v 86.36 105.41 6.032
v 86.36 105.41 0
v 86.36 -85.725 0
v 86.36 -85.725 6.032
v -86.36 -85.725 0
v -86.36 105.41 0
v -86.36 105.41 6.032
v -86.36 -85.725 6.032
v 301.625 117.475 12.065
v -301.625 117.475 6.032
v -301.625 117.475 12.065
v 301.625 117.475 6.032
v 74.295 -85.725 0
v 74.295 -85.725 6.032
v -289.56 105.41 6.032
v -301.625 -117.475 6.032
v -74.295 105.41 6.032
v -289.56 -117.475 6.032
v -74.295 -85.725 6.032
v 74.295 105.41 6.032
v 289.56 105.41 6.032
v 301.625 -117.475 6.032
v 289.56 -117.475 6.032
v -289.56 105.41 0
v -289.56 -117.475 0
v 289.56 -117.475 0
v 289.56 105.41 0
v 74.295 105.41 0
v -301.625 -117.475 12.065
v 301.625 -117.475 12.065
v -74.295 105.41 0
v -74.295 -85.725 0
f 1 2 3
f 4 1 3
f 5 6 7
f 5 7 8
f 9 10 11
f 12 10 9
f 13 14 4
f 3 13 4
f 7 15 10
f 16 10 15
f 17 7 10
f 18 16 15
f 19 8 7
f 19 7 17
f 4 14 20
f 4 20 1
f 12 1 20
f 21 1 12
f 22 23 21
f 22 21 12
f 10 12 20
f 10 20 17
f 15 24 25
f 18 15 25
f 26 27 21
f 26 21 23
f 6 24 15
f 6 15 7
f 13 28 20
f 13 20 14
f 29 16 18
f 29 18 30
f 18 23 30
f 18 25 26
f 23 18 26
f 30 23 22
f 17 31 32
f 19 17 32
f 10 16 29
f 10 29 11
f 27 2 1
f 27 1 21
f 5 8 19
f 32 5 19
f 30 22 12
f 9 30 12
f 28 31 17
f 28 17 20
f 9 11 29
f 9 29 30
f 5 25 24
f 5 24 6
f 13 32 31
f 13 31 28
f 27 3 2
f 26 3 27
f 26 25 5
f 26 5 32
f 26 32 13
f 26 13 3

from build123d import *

# Parameters (mm, degrees)
F1_W      = 603.25
F1_H      = 234.95
F2_DEPTH  = 12.065
F3_W      = 12.065
F3_H      = 234.95
F4_DEPTH  = 6.0325
F5_W      = 12.065
F5_H      = 234.95
F6_DEPTH  = 6.0325
F7_W      = 12.065
F7_H      = 234.95
F8_DEPTH  = 6.0325
F9_W      = 12.065
F9_H      = 234.95
F10_DEPTH = 6.0325
F11_W     = 203.2
F11_H     = 12.065
F14_DEPTH = 6.0325
F12_W     = 148.59
F12_H     = 12.065
F15_DEPTH = 6.0325
F13_W     = 203.2
F13_H     = 12.065
F16_DEPTH = 6.0325
F17_W     = 12.065
F17_H     = 31.75
F18_DEPTH = 6.0325
F19_W     = 12.065
F19_H     = 31.75
F20_DEPTH = 6.0325


# Not quite as in the source:
# - a variable given as a bare number and used for a length is read in inches; the dataset says mm whatever the document's units were


with BuildPart() as f2:
    # F1 (on Top) → F2 (new body)
    with BuildSketch(Plane.XY):
        Rectangle(F1_W, F1_H)
    extrude(amount=F2_DEPTH)

    # F3 (on face) → F4 (cut)
    with BuildSketch(Plane(origin=(0, 0, 0), x_dir=(1, 0, 0), z_dir=(0, 0, -1))):
        with Locations((-295.5925, 0)):
            Rectangle(F3_W, F3_H)
    extrude(amount=-F4_DEPTH, mode=Mode.SUBTRACT)

    # F5 (on face) → F6 (cut)
    with BuildSketch(Plane(origin=(0, 0, 0), x_dir=(1, 0, 0), z_dir=(0, 0, -1))):
        with Locations((295.5925, 0)):
            Rectangle(F5_W, F5_H)
    extrude(amount=-F6_DEPTH, mode=Mode.SUBTRACT)

    # F7 (on face) → F8 (cut)
    with BuildSketch(Plane(origin=(0, 0, 0), x_dir=(1, 0, 0), z_dir=(0, 0, -1))):
        with Locations((80.3275, 0)):
            Rectangle(F7_W, F7_H)
    extrude(amount=-F8_DEPTH, mode=Mode.SUBTRACT)

    # F9 (on face) → F10 (cut)
    with BuildSketch(Plane(origin=(0, 0, 0), x_dir=(1, 0, 0), z_dir=(0, 0, -1))):
        with Locations((-80.3275, 0)):
            Rectangle(F9_W, F9_H)
    extrude(amount=-F10_DEPTH, mode=Mode.SUBTRACT)

    # F11 (on face) → F14 (cut)
    with BuildSketch(Plane(origin=(0, 0, 0), x_dir=(1, 0, 0), z_dir=(0, 0, -1))):
        with Locations((187.96, -111.4425)):
            Rectangle(F11_W, F11_H)
    extrude(amount=-F14_DEPTH, mode=Mode.SUBTRACT)

    # F12 (on face) → F15 (cut)
    with BuildSketch(Plane(origin=(0, 0, 0), x_dir=(1, 0, 0), z_dir=(0, 0, -1))):
        with Locations((0, -111.4425)):
            Rectangle(F12_W, F12_H)
    extrude(amount=-F15_DEPTH, mode=Mode.SUBTRACT)

    # F13 (on face) → F16 (cut)
    with BuildSketch(Plane(origin=(0, 0, 0), x_dir=(1, 0, 0), z_dir=(0, 0, -1))):
        with Locations((-187.96, -111.4425)):
            Rectangle(F13_W, F13_H)
    extrude(amount=-F16_DEPTH, mode=Mode.SUBTRACT)

    # F17 (on face) → F18 (join)
    with BuildSketch(Plane(origin=(0, 0, 6.0325), x_dir=(1, 0, 0), z_dir=(0, 0, -1))):
        with Locations((80.3275, 101.6)):
            Rectangle(F17_W, F17_H)
    extrude(amount=F18_DEPTH)

    # F19 (on face) → F20 (join)
    with BuildSketch(Plane(origin=(0, 0, 6.0325), x_dir=(1, 0, 0), z_dir=(0, 0, -1))):
        with Locations((-80.3275, 101.6)):
            Rectangle(F19_W, F19_H)
    extrude(amount=F20_DEPTH)


solid = f2.part
